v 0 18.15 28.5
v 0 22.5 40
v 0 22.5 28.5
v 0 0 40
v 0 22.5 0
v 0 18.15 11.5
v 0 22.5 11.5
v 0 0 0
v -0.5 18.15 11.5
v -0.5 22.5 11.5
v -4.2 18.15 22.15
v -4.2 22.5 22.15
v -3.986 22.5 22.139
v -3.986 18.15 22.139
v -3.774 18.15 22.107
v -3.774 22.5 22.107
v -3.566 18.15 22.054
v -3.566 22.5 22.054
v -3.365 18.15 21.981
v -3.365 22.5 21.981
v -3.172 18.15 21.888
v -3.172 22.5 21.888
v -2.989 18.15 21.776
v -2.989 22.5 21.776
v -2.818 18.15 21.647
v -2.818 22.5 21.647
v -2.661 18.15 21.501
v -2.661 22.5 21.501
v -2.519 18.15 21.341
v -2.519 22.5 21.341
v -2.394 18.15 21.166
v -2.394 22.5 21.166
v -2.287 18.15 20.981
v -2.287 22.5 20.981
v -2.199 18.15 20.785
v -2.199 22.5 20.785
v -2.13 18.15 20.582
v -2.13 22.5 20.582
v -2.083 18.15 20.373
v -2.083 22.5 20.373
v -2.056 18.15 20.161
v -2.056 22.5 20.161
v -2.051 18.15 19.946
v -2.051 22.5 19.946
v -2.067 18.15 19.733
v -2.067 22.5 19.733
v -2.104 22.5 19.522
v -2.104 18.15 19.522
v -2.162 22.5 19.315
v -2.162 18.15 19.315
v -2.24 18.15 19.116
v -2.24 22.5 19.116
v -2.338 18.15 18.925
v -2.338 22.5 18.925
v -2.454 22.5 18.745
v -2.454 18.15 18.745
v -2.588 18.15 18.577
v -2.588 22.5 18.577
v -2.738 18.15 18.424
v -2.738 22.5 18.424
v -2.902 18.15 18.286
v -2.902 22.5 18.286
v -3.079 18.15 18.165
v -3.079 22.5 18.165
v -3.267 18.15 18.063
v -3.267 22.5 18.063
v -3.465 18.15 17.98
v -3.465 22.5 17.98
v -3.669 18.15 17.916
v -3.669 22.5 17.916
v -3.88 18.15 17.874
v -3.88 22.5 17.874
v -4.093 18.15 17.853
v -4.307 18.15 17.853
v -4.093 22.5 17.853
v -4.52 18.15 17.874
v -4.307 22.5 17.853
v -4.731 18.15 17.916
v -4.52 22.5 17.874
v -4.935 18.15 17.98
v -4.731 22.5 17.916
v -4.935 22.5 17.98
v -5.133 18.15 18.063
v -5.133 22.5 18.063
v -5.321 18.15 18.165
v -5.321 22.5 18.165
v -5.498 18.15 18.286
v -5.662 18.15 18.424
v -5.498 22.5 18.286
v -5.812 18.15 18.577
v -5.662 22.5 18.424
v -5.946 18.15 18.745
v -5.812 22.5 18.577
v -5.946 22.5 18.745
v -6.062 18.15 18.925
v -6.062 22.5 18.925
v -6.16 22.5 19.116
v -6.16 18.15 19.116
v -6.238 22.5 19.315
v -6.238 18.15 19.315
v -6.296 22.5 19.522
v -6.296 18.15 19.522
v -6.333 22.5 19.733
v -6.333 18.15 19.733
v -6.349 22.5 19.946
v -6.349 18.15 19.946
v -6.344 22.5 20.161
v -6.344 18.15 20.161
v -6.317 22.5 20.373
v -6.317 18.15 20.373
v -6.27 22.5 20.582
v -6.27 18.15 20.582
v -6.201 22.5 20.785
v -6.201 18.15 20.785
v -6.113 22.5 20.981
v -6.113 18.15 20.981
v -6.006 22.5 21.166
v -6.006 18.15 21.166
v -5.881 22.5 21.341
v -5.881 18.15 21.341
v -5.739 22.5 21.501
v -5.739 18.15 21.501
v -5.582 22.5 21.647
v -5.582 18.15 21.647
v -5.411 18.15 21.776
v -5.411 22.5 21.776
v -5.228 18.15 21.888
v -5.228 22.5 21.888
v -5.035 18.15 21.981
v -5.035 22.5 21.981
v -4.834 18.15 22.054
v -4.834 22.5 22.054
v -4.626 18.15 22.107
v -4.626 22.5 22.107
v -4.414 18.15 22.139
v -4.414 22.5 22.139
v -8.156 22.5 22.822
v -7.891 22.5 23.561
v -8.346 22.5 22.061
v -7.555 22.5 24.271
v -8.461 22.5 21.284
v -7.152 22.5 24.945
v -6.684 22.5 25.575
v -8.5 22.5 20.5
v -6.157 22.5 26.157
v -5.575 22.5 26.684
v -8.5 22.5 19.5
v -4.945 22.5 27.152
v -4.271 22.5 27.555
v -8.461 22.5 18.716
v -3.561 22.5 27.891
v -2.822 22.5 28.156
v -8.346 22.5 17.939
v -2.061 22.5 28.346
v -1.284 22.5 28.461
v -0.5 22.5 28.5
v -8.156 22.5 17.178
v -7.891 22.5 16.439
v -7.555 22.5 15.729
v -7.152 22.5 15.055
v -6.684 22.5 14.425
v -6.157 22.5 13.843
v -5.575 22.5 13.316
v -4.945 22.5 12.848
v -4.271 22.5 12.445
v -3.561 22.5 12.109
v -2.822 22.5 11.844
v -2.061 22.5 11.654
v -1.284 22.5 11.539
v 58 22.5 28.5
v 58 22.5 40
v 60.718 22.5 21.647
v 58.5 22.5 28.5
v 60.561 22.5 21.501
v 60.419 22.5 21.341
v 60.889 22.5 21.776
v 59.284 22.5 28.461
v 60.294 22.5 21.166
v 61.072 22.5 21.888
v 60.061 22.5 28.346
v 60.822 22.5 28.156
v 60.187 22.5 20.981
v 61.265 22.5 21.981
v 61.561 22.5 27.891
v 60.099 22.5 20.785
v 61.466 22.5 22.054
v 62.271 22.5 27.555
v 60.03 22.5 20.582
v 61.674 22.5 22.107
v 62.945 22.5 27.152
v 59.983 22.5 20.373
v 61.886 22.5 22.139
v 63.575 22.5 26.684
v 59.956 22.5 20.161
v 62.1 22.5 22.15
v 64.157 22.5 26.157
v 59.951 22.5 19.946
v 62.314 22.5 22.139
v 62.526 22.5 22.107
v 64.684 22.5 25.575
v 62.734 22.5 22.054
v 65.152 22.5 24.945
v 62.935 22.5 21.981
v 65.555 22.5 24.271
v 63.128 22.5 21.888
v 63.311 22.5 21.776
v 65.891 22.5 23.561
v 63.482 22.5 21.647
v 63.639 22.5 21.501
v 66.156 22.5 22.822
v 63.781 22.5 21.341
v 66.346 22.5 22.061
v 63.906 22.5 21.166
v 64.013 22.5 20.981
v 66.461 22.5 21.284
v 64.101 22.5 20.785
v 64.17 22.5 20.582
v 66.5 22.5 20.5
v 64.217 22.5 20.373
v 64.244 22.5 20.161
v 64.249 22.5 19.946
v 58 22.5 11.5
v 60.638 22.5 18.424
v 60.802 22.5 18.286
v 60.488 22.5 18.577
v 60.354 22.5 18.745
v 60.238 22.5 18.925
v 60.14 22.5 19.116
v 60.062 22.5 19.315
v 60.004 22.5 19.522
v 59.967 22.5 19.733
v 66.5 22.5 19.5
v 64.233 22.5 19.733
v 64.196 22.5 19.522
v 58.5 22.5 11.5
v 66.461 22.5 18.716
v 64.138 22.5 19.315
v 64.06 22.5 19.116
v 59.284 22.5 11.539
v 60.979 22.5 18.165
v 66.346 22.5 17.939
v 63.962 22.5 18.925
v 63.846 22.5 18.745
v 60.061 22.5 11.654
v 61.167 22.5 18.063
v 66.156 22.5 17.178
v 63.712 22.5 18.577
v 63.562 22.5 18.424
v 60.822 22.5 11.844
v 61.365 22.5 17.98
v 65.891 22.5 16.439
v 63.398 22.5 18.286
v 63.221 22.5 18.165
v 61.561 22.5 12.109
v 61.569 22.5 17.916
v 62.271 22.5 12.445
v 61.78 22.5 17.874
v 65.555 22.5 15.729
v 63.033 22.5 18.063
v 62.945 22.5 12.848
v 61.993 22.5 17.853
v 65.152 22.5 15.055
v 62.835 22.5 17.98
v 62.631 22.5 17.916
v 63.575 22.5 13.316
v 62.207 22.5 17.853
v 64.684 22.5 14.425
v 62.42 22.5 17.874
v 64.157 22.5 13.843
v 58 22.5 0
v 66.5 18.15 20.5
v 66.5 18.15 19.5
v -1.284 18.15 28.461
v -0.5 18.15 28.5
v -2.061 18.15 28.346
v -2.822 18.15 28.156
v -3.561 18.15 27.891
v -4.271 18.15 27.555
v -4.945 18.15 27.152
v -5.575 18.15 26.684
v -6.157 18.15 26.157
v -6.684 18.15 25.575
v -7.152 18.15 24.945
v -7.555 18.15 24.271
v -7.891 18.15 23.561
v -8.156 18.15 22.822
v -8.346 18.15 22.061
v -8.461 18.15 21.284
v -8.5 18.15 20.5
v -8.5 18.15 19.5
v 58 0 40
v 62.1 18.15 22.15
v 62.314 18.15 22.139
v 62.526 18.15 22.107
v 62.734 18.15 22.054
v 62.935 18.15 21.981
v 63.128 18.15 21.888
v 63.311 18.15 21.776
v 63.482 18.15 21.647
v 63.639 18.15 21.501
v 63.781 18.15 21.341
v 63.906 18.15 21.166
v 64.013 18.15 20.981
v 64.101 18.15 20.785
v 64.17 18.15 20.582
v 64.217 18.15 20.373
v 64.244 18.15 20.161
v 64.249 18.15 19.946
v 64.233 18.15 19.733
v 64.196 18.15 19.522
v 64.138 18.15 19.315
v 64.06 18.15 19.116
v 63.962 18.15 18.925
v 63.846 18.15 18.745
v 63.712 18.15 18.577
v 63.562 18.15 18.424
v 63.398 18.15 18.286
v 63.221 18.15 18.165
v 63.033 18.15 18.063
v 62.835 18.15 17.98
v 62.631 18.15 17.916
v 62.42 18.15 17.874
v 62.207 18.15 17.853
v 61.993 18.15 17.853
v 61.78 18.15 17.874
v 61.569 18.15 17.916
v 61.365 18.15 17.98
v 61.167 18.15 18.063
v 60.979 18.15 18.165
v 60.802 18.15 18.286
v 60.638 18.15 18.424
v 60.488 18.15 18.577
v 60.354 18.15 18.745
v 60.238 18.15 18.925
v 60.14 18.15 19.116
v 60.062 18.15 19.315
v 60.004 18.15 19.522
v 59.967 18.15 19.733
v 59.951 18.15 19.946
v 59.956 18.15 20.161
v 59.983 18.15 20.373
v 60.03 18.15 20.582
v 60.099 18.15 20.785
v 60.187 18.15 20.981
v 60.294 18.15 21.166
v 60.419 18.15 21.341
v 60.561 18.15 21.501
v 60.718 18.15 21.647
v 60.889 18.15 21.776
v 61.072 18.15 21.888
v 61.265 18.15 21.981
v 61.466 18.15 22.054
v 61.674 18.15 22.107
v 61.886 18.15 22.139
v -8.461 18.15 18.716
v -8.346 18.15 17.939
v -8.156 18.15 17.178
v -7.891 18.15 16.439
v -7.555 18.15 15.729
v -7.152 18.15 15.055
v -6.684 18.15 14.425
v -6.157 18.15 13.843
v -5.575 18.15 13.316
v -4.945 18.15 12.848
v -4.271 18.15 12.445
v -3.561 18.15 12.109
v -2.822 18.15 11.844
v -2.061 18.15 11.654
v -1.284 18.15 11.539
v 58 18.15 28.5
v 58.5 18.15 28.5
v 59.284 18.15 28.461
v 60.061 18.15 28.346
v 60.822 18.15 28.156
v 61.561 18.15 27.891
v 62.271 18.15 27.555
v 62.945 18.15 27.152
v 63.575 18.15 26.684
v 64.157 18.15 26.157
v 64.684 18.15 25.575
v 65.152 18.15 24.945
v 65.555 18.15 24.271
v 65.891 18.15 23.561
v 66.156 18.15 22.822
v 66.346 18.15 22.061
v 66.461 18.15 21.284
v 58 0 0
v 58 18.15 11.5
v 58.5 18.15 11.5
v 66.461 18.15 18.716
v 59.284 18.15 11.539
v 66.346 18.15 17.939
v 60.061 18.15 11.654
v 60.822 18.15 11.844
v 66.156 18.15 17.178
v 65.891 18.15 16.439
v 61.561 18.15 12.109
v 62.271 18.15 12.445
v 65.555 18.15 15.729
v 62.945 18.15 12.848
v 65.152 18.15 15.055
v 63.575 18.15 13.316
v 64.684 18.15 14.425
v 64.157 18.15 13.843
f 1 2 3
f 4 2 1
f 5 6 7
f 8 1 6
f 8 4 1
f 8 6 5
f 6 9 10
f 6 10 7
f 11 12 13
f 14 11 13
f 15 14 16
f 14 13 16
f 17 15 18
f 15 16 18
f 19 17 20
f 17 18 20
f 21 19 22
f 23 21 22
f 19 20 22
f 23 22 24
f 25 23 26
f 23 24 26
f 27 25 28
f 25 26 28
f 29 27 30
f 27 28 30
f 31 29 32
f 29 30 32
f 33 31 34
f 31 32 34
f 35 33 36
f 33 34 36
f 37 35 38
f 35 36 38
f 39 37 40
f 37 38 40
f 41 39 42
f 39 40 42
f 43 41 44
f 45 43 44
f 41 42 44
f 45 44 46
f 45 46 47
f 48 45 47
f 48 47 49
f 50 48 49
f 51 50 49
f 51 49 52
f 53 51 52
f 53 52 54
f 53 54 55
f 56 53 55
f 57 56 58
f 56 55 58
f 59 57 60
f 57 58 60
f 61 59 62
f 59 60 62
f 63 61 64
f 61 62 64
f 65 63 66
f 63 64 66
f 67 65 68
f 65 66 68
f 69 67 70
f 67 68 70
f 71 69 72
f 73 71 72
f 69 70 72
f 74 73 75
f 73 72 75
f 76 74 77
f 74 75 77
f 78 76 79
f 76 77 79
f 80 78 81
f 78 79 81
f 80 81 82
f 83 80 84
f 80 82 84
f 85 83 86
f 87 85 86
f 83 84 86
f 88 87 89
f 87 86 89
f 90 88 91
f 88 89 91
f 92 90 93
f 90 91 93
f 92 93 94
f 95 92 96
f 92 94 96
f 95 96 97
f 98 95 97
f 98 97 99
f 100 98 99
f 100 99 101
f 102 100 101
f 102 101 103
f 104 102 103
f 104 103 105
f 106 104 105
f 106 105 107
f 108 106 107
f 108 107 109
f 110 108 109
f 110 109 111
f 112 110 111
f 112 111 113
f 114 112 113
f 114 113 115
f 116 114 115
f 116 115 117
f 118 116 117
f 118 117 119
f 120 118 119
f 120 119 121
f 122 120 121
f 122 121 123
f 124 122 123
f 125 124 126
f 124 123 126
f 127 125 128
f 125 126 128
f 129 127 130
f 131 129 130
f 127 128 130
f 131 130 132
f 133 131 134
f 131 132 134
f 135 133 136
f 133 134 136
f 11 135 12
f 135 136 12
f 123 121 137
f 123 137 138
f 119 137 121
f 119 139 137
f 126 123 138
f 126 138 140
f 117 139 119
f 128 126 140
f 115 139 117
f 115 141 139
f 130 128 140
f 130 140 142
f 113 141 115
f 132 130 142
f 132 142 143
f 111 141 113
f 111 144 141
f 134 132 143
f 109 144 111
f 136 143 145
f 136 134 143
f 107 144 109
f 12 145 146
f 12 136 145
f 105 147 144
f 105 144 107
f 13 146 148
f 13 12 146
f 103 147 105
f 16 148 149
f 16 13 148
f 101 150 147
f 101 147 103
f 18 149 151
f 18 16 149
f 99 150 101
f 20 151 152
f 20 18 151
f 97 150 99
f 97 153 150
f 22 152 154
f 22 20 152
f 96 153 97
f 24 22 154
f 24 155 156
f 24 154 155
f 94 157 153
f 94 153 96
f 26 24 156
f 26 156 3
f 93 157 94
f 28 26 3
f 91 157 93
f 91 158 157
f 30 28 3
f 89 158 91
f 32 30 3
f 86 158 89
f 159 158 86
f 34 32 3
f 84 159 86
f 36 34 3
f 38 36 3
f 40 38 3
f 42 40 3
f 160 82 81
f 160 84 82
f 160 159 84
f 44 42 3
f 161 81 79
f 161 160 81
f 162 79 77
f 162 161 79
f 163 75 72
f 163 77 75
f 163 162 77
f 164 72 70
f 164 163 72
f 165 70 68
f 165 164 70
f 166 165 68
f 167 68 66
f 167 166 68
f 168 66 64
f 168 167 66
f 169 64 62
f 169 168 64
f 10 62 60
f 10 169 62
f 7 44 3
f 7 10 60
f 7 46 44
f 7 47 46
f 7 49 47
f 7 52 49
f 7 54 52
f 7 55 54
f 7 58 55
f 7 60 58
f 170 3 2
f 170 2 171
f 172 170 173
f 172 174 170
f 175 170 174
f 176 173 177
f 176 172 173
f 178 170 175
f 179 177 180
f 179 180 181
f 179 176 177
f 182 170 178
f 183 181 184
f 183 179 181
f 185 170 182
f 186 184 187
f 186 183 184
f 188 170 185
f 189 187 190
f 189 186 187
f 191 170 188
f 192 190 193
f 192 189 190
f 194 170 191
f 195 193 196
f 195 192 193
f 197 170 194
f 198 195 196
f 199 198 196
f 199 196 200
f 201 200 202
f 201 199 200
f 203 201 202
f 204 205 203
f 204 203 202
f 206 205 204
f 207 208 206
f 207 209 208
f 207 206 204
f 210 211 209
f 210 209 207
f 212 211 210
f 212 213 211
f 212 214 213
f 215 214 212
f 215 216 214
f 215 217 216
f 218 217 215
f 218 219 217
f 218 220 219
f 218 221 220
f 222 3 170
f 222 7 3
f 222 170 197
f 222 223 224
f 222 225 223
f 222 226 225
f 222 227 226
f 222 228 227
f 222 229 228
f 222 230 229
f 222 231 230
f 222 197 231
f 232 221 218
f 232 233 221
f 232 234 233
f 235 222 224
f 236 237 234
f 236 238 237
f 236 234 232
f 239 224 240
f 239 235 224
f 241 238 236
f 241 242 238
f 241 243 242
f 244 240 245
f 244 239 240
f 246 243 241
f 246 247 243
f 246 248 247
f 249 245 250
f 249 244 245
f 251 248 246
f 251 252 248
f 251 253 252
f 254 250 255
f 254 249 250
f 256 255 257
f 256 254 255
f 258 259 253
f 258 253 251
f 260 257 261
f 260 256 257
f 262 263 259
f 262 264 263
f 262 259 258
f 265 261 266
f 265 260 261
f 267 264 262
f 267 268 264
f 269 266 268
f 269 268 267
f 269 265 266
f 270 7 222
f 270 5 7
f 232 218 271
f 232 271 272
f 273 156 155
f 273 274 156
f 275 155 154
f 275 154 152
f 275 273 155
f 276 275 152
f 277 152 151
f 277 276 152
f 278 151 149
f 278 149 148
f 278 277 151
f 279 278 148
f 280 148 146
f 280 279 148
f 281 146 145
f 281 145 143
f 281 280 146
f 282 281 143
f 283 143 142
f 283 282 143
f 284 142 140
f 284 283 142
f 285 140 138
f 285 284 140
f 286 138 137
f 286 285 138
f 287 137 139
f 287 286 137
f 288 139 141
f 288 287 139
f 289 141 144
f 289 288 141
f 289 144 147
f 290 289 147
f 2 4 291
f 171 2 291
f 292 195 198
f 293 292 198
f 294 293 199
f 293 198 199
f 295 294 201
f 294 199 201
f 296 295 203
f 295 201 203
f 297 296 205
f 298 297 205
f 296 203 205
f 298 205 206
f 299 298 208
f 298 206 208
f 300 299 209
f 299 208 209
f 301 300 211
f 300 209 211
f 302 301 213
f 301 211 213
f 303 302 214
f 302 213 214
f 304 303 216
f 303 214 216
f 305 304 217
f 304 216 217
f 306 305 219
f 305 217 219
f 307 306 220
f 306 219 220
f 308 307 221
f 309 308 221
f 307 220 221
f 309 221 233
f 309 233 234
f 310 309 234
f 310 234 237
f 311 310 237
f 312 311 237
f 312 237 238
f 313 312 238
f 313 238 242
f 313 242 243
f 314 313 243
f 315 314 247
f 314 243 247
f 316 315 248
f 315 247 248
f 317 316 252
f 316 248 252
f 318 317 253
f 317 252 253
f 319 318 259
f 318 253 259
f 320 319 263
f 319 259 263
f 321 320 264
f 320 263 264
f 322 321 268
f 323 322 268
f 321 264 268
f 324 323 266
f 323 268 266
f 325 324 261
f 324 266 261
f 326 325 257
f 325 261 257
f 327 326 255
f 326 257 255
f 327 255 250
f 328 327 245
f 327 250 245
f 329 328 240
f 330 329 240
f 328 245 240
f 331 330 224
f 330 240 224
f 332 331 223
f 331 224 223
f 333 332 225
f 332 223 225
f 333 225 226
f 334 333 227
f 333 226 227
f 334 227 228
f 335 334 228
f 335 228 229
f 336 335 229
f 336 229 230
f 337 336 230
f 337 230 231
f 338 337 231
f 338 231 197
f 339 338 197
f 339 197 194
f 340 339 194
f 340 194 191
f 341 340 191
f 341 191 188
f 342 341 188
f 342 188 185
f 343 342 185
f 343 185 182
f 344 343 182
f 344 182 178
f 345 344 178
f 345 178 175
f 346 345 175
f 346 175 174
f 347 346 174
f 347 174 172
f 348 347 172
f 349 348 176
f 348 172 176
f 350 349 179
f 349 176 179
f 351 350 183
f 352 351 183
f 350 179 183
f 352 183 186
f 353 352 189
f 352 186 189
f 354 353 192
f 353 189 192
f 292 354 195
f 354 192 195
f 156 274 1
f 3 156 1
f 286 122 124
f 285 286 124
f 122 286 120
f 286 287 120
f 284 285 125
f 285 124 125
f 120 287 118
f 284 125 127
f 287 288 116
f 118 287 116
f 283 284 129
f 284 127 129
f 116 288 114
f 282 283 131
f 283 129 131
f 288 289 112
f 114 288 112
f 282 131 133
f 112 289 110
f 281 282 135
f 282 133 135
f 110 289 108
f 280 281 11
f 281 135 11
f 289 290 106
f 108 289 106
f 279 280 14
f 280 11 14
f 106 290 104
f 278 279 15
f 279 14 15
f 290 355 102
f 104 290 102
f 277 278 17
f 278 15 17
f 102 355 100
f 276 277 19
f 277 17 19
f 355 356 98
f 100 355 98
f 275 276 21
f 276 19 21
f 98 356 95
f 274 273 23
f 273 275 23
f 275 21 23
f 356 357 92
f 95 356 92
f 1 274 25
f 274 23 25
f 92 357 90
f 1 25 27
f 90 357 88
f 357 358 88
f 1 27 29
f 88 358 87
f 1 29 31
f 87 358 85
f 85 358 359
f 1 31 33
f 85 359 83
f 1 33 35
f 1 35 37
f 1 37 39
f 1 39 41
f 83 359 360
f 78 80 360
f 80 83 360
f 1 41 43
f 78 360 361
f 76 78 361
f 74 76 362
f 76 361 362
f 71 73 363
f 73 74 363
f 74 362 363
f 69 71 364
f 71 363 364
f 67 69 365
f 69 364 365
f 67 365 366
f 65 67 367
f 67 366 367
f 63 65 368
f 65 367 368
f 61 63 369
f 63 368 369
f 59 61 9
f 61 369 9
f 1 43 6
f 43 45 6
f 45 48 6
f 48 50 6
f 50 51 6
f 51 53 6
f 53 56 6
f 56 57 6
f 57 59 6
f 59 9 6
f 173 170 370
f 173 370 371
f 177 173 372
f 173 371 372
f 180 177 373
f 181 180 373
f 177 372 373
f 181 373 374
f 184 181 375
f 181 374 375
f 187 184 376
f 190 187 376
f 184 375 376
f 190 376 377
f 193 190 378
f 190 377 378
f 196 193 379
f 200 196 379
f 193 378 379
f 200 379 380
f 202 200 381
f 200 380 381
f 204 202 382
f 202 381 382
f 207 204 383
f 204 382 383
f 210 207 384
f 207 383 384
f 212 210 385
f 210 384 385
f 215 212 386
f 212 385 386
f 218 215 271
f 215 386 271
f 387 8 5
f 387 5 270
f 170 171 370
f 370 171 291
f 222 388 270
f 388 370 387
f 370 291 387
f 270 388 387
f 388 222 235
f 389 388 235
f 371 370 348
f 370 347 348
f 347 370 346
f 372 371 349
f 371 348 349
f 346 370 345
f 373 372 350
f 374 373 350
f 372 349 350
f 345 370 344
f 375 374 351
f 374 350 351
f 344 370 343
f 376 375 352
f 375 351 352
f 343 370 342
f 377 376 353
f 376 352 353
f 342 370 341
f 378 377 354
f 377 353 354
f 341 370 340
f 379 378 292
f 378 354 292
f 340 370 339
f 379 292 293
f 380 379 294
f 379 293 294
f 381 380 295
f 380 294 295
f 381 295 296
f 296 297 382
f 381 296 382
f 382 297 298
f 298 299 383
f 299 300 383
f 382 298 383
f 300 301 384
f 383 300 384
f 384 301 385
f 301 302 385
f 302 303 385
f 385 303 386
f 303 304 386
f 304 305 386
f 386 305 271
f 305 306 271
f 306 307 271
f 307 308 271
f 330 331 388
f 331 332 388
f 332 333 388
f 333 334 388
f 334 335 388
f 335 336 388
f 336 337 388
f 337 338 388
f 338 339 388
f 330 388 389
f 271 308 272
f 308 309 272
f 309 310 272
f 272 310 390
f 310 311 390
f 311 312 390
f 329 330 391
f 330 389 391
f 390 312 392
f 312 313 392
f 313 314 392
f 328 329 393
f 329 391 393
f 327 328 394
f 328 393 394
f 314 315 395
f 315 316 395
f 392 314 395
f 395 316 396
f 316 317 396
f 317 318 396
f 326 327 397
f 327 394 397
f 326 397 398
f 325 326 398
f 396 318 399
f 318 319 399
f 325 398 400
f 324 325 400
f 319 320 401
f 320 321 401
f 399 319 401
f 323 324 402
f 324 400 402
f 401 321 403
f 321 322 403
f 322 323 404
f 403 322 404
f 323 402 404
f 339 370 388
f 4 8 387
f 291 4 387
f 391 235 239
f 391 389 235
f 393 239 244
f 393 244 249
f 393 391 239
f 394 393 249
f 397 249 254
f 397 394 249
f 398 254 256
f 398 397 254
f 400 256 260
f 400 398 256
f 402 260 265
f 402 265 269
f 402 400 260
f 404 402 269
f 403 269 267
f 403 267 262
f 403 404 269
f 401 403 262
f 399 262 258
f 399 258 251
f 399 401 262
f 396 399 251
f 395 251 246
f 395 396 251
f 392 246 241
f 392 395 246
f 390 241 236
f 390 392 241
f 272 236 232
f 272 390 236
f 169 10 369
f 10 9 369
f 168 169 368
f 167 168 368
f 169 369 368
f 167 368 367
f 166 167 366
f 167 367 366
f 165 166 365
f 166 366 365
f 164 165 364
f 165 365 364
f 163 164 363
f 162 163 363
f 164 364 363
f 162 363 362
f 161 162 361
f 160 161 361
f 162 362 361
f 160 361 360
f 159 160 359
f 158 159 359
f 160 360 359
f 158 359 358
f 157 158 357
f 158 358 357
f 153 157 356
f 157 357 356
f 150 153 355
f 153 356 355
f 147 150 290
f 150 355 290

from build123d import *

# Parameters (mm, degrees)
SKETCH1_W           = 58
SKETCH1_H           = 40
BOSS_EXTRUDE1_DEPTH = 22.5
SKETCH2_W           = 8.5
SKETCH2_H           = 17
SKETCH2_R           = 2.15
BOSS_EXTRUDE2_DEPTH = 4.35
FILLET1_R           = 8


with BuildPart() as part:
    # Sketch1 → Boss-Extrude1 (new body)
    with BuildSketch(Plane(origin=(0, 0, 0), x_dir=(1, 0, 0), z_dir=(0, 1, 0))):
        with Locations((29, -20)):
            Rectangle(SKETCH1_W, SKETCH1_H)
    extrude(amount=BOSS_EXTRUDE1_DEPTH)

    # Sketch2 → Boss-Extrude2 (add)
    # profile 1 of 2: a face of its own
    with BuildSketch(Plane(origin=(0, 22.5, 0), x_dir=(1, 0, 0), z_dir=(0, 1, 0))):
        with Locations((62.25, -20)):
            Rectangle(SKETCH2_W, SKETCH2_H)
        with Locations(Location((62.1, -20, 0), (0, 0, 270))):
            Circle(SKETCH2_R, mode=Mode.SUBTRACT)
    # profile 2 of 2: a face of its own
    with BuildSketch(Plane(origin=(0, 22.5, 0), x_dir=(1, 0, 0), z_dir=(0, 1, 0))):
        with Locations((-4.25, -20)):
            Rectangle(SKETCH2_W, SKETCH2_H)
        with Locations(Location((-4.2, -20, 0), (0, 0, 270))):
            Circle(SKETCH2_R, mode=Mode.SUBTRACT)
    extrude(amount=-BOSS_EXTRUDE2_DEPTH)

    # Fillet1
    fillet1_edges = [part.edges().sort_by_distance(p)[0] for p in [
        (66.5, 20.325, 11.5),
        (66.5, 20.325, 28.5),
        (-8.5, 20.325, 28.5),
        (-8.5, 20.325, 11.5),
    ]]
    fillet(fillet1_edges, radius=FILLET1_R)


solid = part.part
